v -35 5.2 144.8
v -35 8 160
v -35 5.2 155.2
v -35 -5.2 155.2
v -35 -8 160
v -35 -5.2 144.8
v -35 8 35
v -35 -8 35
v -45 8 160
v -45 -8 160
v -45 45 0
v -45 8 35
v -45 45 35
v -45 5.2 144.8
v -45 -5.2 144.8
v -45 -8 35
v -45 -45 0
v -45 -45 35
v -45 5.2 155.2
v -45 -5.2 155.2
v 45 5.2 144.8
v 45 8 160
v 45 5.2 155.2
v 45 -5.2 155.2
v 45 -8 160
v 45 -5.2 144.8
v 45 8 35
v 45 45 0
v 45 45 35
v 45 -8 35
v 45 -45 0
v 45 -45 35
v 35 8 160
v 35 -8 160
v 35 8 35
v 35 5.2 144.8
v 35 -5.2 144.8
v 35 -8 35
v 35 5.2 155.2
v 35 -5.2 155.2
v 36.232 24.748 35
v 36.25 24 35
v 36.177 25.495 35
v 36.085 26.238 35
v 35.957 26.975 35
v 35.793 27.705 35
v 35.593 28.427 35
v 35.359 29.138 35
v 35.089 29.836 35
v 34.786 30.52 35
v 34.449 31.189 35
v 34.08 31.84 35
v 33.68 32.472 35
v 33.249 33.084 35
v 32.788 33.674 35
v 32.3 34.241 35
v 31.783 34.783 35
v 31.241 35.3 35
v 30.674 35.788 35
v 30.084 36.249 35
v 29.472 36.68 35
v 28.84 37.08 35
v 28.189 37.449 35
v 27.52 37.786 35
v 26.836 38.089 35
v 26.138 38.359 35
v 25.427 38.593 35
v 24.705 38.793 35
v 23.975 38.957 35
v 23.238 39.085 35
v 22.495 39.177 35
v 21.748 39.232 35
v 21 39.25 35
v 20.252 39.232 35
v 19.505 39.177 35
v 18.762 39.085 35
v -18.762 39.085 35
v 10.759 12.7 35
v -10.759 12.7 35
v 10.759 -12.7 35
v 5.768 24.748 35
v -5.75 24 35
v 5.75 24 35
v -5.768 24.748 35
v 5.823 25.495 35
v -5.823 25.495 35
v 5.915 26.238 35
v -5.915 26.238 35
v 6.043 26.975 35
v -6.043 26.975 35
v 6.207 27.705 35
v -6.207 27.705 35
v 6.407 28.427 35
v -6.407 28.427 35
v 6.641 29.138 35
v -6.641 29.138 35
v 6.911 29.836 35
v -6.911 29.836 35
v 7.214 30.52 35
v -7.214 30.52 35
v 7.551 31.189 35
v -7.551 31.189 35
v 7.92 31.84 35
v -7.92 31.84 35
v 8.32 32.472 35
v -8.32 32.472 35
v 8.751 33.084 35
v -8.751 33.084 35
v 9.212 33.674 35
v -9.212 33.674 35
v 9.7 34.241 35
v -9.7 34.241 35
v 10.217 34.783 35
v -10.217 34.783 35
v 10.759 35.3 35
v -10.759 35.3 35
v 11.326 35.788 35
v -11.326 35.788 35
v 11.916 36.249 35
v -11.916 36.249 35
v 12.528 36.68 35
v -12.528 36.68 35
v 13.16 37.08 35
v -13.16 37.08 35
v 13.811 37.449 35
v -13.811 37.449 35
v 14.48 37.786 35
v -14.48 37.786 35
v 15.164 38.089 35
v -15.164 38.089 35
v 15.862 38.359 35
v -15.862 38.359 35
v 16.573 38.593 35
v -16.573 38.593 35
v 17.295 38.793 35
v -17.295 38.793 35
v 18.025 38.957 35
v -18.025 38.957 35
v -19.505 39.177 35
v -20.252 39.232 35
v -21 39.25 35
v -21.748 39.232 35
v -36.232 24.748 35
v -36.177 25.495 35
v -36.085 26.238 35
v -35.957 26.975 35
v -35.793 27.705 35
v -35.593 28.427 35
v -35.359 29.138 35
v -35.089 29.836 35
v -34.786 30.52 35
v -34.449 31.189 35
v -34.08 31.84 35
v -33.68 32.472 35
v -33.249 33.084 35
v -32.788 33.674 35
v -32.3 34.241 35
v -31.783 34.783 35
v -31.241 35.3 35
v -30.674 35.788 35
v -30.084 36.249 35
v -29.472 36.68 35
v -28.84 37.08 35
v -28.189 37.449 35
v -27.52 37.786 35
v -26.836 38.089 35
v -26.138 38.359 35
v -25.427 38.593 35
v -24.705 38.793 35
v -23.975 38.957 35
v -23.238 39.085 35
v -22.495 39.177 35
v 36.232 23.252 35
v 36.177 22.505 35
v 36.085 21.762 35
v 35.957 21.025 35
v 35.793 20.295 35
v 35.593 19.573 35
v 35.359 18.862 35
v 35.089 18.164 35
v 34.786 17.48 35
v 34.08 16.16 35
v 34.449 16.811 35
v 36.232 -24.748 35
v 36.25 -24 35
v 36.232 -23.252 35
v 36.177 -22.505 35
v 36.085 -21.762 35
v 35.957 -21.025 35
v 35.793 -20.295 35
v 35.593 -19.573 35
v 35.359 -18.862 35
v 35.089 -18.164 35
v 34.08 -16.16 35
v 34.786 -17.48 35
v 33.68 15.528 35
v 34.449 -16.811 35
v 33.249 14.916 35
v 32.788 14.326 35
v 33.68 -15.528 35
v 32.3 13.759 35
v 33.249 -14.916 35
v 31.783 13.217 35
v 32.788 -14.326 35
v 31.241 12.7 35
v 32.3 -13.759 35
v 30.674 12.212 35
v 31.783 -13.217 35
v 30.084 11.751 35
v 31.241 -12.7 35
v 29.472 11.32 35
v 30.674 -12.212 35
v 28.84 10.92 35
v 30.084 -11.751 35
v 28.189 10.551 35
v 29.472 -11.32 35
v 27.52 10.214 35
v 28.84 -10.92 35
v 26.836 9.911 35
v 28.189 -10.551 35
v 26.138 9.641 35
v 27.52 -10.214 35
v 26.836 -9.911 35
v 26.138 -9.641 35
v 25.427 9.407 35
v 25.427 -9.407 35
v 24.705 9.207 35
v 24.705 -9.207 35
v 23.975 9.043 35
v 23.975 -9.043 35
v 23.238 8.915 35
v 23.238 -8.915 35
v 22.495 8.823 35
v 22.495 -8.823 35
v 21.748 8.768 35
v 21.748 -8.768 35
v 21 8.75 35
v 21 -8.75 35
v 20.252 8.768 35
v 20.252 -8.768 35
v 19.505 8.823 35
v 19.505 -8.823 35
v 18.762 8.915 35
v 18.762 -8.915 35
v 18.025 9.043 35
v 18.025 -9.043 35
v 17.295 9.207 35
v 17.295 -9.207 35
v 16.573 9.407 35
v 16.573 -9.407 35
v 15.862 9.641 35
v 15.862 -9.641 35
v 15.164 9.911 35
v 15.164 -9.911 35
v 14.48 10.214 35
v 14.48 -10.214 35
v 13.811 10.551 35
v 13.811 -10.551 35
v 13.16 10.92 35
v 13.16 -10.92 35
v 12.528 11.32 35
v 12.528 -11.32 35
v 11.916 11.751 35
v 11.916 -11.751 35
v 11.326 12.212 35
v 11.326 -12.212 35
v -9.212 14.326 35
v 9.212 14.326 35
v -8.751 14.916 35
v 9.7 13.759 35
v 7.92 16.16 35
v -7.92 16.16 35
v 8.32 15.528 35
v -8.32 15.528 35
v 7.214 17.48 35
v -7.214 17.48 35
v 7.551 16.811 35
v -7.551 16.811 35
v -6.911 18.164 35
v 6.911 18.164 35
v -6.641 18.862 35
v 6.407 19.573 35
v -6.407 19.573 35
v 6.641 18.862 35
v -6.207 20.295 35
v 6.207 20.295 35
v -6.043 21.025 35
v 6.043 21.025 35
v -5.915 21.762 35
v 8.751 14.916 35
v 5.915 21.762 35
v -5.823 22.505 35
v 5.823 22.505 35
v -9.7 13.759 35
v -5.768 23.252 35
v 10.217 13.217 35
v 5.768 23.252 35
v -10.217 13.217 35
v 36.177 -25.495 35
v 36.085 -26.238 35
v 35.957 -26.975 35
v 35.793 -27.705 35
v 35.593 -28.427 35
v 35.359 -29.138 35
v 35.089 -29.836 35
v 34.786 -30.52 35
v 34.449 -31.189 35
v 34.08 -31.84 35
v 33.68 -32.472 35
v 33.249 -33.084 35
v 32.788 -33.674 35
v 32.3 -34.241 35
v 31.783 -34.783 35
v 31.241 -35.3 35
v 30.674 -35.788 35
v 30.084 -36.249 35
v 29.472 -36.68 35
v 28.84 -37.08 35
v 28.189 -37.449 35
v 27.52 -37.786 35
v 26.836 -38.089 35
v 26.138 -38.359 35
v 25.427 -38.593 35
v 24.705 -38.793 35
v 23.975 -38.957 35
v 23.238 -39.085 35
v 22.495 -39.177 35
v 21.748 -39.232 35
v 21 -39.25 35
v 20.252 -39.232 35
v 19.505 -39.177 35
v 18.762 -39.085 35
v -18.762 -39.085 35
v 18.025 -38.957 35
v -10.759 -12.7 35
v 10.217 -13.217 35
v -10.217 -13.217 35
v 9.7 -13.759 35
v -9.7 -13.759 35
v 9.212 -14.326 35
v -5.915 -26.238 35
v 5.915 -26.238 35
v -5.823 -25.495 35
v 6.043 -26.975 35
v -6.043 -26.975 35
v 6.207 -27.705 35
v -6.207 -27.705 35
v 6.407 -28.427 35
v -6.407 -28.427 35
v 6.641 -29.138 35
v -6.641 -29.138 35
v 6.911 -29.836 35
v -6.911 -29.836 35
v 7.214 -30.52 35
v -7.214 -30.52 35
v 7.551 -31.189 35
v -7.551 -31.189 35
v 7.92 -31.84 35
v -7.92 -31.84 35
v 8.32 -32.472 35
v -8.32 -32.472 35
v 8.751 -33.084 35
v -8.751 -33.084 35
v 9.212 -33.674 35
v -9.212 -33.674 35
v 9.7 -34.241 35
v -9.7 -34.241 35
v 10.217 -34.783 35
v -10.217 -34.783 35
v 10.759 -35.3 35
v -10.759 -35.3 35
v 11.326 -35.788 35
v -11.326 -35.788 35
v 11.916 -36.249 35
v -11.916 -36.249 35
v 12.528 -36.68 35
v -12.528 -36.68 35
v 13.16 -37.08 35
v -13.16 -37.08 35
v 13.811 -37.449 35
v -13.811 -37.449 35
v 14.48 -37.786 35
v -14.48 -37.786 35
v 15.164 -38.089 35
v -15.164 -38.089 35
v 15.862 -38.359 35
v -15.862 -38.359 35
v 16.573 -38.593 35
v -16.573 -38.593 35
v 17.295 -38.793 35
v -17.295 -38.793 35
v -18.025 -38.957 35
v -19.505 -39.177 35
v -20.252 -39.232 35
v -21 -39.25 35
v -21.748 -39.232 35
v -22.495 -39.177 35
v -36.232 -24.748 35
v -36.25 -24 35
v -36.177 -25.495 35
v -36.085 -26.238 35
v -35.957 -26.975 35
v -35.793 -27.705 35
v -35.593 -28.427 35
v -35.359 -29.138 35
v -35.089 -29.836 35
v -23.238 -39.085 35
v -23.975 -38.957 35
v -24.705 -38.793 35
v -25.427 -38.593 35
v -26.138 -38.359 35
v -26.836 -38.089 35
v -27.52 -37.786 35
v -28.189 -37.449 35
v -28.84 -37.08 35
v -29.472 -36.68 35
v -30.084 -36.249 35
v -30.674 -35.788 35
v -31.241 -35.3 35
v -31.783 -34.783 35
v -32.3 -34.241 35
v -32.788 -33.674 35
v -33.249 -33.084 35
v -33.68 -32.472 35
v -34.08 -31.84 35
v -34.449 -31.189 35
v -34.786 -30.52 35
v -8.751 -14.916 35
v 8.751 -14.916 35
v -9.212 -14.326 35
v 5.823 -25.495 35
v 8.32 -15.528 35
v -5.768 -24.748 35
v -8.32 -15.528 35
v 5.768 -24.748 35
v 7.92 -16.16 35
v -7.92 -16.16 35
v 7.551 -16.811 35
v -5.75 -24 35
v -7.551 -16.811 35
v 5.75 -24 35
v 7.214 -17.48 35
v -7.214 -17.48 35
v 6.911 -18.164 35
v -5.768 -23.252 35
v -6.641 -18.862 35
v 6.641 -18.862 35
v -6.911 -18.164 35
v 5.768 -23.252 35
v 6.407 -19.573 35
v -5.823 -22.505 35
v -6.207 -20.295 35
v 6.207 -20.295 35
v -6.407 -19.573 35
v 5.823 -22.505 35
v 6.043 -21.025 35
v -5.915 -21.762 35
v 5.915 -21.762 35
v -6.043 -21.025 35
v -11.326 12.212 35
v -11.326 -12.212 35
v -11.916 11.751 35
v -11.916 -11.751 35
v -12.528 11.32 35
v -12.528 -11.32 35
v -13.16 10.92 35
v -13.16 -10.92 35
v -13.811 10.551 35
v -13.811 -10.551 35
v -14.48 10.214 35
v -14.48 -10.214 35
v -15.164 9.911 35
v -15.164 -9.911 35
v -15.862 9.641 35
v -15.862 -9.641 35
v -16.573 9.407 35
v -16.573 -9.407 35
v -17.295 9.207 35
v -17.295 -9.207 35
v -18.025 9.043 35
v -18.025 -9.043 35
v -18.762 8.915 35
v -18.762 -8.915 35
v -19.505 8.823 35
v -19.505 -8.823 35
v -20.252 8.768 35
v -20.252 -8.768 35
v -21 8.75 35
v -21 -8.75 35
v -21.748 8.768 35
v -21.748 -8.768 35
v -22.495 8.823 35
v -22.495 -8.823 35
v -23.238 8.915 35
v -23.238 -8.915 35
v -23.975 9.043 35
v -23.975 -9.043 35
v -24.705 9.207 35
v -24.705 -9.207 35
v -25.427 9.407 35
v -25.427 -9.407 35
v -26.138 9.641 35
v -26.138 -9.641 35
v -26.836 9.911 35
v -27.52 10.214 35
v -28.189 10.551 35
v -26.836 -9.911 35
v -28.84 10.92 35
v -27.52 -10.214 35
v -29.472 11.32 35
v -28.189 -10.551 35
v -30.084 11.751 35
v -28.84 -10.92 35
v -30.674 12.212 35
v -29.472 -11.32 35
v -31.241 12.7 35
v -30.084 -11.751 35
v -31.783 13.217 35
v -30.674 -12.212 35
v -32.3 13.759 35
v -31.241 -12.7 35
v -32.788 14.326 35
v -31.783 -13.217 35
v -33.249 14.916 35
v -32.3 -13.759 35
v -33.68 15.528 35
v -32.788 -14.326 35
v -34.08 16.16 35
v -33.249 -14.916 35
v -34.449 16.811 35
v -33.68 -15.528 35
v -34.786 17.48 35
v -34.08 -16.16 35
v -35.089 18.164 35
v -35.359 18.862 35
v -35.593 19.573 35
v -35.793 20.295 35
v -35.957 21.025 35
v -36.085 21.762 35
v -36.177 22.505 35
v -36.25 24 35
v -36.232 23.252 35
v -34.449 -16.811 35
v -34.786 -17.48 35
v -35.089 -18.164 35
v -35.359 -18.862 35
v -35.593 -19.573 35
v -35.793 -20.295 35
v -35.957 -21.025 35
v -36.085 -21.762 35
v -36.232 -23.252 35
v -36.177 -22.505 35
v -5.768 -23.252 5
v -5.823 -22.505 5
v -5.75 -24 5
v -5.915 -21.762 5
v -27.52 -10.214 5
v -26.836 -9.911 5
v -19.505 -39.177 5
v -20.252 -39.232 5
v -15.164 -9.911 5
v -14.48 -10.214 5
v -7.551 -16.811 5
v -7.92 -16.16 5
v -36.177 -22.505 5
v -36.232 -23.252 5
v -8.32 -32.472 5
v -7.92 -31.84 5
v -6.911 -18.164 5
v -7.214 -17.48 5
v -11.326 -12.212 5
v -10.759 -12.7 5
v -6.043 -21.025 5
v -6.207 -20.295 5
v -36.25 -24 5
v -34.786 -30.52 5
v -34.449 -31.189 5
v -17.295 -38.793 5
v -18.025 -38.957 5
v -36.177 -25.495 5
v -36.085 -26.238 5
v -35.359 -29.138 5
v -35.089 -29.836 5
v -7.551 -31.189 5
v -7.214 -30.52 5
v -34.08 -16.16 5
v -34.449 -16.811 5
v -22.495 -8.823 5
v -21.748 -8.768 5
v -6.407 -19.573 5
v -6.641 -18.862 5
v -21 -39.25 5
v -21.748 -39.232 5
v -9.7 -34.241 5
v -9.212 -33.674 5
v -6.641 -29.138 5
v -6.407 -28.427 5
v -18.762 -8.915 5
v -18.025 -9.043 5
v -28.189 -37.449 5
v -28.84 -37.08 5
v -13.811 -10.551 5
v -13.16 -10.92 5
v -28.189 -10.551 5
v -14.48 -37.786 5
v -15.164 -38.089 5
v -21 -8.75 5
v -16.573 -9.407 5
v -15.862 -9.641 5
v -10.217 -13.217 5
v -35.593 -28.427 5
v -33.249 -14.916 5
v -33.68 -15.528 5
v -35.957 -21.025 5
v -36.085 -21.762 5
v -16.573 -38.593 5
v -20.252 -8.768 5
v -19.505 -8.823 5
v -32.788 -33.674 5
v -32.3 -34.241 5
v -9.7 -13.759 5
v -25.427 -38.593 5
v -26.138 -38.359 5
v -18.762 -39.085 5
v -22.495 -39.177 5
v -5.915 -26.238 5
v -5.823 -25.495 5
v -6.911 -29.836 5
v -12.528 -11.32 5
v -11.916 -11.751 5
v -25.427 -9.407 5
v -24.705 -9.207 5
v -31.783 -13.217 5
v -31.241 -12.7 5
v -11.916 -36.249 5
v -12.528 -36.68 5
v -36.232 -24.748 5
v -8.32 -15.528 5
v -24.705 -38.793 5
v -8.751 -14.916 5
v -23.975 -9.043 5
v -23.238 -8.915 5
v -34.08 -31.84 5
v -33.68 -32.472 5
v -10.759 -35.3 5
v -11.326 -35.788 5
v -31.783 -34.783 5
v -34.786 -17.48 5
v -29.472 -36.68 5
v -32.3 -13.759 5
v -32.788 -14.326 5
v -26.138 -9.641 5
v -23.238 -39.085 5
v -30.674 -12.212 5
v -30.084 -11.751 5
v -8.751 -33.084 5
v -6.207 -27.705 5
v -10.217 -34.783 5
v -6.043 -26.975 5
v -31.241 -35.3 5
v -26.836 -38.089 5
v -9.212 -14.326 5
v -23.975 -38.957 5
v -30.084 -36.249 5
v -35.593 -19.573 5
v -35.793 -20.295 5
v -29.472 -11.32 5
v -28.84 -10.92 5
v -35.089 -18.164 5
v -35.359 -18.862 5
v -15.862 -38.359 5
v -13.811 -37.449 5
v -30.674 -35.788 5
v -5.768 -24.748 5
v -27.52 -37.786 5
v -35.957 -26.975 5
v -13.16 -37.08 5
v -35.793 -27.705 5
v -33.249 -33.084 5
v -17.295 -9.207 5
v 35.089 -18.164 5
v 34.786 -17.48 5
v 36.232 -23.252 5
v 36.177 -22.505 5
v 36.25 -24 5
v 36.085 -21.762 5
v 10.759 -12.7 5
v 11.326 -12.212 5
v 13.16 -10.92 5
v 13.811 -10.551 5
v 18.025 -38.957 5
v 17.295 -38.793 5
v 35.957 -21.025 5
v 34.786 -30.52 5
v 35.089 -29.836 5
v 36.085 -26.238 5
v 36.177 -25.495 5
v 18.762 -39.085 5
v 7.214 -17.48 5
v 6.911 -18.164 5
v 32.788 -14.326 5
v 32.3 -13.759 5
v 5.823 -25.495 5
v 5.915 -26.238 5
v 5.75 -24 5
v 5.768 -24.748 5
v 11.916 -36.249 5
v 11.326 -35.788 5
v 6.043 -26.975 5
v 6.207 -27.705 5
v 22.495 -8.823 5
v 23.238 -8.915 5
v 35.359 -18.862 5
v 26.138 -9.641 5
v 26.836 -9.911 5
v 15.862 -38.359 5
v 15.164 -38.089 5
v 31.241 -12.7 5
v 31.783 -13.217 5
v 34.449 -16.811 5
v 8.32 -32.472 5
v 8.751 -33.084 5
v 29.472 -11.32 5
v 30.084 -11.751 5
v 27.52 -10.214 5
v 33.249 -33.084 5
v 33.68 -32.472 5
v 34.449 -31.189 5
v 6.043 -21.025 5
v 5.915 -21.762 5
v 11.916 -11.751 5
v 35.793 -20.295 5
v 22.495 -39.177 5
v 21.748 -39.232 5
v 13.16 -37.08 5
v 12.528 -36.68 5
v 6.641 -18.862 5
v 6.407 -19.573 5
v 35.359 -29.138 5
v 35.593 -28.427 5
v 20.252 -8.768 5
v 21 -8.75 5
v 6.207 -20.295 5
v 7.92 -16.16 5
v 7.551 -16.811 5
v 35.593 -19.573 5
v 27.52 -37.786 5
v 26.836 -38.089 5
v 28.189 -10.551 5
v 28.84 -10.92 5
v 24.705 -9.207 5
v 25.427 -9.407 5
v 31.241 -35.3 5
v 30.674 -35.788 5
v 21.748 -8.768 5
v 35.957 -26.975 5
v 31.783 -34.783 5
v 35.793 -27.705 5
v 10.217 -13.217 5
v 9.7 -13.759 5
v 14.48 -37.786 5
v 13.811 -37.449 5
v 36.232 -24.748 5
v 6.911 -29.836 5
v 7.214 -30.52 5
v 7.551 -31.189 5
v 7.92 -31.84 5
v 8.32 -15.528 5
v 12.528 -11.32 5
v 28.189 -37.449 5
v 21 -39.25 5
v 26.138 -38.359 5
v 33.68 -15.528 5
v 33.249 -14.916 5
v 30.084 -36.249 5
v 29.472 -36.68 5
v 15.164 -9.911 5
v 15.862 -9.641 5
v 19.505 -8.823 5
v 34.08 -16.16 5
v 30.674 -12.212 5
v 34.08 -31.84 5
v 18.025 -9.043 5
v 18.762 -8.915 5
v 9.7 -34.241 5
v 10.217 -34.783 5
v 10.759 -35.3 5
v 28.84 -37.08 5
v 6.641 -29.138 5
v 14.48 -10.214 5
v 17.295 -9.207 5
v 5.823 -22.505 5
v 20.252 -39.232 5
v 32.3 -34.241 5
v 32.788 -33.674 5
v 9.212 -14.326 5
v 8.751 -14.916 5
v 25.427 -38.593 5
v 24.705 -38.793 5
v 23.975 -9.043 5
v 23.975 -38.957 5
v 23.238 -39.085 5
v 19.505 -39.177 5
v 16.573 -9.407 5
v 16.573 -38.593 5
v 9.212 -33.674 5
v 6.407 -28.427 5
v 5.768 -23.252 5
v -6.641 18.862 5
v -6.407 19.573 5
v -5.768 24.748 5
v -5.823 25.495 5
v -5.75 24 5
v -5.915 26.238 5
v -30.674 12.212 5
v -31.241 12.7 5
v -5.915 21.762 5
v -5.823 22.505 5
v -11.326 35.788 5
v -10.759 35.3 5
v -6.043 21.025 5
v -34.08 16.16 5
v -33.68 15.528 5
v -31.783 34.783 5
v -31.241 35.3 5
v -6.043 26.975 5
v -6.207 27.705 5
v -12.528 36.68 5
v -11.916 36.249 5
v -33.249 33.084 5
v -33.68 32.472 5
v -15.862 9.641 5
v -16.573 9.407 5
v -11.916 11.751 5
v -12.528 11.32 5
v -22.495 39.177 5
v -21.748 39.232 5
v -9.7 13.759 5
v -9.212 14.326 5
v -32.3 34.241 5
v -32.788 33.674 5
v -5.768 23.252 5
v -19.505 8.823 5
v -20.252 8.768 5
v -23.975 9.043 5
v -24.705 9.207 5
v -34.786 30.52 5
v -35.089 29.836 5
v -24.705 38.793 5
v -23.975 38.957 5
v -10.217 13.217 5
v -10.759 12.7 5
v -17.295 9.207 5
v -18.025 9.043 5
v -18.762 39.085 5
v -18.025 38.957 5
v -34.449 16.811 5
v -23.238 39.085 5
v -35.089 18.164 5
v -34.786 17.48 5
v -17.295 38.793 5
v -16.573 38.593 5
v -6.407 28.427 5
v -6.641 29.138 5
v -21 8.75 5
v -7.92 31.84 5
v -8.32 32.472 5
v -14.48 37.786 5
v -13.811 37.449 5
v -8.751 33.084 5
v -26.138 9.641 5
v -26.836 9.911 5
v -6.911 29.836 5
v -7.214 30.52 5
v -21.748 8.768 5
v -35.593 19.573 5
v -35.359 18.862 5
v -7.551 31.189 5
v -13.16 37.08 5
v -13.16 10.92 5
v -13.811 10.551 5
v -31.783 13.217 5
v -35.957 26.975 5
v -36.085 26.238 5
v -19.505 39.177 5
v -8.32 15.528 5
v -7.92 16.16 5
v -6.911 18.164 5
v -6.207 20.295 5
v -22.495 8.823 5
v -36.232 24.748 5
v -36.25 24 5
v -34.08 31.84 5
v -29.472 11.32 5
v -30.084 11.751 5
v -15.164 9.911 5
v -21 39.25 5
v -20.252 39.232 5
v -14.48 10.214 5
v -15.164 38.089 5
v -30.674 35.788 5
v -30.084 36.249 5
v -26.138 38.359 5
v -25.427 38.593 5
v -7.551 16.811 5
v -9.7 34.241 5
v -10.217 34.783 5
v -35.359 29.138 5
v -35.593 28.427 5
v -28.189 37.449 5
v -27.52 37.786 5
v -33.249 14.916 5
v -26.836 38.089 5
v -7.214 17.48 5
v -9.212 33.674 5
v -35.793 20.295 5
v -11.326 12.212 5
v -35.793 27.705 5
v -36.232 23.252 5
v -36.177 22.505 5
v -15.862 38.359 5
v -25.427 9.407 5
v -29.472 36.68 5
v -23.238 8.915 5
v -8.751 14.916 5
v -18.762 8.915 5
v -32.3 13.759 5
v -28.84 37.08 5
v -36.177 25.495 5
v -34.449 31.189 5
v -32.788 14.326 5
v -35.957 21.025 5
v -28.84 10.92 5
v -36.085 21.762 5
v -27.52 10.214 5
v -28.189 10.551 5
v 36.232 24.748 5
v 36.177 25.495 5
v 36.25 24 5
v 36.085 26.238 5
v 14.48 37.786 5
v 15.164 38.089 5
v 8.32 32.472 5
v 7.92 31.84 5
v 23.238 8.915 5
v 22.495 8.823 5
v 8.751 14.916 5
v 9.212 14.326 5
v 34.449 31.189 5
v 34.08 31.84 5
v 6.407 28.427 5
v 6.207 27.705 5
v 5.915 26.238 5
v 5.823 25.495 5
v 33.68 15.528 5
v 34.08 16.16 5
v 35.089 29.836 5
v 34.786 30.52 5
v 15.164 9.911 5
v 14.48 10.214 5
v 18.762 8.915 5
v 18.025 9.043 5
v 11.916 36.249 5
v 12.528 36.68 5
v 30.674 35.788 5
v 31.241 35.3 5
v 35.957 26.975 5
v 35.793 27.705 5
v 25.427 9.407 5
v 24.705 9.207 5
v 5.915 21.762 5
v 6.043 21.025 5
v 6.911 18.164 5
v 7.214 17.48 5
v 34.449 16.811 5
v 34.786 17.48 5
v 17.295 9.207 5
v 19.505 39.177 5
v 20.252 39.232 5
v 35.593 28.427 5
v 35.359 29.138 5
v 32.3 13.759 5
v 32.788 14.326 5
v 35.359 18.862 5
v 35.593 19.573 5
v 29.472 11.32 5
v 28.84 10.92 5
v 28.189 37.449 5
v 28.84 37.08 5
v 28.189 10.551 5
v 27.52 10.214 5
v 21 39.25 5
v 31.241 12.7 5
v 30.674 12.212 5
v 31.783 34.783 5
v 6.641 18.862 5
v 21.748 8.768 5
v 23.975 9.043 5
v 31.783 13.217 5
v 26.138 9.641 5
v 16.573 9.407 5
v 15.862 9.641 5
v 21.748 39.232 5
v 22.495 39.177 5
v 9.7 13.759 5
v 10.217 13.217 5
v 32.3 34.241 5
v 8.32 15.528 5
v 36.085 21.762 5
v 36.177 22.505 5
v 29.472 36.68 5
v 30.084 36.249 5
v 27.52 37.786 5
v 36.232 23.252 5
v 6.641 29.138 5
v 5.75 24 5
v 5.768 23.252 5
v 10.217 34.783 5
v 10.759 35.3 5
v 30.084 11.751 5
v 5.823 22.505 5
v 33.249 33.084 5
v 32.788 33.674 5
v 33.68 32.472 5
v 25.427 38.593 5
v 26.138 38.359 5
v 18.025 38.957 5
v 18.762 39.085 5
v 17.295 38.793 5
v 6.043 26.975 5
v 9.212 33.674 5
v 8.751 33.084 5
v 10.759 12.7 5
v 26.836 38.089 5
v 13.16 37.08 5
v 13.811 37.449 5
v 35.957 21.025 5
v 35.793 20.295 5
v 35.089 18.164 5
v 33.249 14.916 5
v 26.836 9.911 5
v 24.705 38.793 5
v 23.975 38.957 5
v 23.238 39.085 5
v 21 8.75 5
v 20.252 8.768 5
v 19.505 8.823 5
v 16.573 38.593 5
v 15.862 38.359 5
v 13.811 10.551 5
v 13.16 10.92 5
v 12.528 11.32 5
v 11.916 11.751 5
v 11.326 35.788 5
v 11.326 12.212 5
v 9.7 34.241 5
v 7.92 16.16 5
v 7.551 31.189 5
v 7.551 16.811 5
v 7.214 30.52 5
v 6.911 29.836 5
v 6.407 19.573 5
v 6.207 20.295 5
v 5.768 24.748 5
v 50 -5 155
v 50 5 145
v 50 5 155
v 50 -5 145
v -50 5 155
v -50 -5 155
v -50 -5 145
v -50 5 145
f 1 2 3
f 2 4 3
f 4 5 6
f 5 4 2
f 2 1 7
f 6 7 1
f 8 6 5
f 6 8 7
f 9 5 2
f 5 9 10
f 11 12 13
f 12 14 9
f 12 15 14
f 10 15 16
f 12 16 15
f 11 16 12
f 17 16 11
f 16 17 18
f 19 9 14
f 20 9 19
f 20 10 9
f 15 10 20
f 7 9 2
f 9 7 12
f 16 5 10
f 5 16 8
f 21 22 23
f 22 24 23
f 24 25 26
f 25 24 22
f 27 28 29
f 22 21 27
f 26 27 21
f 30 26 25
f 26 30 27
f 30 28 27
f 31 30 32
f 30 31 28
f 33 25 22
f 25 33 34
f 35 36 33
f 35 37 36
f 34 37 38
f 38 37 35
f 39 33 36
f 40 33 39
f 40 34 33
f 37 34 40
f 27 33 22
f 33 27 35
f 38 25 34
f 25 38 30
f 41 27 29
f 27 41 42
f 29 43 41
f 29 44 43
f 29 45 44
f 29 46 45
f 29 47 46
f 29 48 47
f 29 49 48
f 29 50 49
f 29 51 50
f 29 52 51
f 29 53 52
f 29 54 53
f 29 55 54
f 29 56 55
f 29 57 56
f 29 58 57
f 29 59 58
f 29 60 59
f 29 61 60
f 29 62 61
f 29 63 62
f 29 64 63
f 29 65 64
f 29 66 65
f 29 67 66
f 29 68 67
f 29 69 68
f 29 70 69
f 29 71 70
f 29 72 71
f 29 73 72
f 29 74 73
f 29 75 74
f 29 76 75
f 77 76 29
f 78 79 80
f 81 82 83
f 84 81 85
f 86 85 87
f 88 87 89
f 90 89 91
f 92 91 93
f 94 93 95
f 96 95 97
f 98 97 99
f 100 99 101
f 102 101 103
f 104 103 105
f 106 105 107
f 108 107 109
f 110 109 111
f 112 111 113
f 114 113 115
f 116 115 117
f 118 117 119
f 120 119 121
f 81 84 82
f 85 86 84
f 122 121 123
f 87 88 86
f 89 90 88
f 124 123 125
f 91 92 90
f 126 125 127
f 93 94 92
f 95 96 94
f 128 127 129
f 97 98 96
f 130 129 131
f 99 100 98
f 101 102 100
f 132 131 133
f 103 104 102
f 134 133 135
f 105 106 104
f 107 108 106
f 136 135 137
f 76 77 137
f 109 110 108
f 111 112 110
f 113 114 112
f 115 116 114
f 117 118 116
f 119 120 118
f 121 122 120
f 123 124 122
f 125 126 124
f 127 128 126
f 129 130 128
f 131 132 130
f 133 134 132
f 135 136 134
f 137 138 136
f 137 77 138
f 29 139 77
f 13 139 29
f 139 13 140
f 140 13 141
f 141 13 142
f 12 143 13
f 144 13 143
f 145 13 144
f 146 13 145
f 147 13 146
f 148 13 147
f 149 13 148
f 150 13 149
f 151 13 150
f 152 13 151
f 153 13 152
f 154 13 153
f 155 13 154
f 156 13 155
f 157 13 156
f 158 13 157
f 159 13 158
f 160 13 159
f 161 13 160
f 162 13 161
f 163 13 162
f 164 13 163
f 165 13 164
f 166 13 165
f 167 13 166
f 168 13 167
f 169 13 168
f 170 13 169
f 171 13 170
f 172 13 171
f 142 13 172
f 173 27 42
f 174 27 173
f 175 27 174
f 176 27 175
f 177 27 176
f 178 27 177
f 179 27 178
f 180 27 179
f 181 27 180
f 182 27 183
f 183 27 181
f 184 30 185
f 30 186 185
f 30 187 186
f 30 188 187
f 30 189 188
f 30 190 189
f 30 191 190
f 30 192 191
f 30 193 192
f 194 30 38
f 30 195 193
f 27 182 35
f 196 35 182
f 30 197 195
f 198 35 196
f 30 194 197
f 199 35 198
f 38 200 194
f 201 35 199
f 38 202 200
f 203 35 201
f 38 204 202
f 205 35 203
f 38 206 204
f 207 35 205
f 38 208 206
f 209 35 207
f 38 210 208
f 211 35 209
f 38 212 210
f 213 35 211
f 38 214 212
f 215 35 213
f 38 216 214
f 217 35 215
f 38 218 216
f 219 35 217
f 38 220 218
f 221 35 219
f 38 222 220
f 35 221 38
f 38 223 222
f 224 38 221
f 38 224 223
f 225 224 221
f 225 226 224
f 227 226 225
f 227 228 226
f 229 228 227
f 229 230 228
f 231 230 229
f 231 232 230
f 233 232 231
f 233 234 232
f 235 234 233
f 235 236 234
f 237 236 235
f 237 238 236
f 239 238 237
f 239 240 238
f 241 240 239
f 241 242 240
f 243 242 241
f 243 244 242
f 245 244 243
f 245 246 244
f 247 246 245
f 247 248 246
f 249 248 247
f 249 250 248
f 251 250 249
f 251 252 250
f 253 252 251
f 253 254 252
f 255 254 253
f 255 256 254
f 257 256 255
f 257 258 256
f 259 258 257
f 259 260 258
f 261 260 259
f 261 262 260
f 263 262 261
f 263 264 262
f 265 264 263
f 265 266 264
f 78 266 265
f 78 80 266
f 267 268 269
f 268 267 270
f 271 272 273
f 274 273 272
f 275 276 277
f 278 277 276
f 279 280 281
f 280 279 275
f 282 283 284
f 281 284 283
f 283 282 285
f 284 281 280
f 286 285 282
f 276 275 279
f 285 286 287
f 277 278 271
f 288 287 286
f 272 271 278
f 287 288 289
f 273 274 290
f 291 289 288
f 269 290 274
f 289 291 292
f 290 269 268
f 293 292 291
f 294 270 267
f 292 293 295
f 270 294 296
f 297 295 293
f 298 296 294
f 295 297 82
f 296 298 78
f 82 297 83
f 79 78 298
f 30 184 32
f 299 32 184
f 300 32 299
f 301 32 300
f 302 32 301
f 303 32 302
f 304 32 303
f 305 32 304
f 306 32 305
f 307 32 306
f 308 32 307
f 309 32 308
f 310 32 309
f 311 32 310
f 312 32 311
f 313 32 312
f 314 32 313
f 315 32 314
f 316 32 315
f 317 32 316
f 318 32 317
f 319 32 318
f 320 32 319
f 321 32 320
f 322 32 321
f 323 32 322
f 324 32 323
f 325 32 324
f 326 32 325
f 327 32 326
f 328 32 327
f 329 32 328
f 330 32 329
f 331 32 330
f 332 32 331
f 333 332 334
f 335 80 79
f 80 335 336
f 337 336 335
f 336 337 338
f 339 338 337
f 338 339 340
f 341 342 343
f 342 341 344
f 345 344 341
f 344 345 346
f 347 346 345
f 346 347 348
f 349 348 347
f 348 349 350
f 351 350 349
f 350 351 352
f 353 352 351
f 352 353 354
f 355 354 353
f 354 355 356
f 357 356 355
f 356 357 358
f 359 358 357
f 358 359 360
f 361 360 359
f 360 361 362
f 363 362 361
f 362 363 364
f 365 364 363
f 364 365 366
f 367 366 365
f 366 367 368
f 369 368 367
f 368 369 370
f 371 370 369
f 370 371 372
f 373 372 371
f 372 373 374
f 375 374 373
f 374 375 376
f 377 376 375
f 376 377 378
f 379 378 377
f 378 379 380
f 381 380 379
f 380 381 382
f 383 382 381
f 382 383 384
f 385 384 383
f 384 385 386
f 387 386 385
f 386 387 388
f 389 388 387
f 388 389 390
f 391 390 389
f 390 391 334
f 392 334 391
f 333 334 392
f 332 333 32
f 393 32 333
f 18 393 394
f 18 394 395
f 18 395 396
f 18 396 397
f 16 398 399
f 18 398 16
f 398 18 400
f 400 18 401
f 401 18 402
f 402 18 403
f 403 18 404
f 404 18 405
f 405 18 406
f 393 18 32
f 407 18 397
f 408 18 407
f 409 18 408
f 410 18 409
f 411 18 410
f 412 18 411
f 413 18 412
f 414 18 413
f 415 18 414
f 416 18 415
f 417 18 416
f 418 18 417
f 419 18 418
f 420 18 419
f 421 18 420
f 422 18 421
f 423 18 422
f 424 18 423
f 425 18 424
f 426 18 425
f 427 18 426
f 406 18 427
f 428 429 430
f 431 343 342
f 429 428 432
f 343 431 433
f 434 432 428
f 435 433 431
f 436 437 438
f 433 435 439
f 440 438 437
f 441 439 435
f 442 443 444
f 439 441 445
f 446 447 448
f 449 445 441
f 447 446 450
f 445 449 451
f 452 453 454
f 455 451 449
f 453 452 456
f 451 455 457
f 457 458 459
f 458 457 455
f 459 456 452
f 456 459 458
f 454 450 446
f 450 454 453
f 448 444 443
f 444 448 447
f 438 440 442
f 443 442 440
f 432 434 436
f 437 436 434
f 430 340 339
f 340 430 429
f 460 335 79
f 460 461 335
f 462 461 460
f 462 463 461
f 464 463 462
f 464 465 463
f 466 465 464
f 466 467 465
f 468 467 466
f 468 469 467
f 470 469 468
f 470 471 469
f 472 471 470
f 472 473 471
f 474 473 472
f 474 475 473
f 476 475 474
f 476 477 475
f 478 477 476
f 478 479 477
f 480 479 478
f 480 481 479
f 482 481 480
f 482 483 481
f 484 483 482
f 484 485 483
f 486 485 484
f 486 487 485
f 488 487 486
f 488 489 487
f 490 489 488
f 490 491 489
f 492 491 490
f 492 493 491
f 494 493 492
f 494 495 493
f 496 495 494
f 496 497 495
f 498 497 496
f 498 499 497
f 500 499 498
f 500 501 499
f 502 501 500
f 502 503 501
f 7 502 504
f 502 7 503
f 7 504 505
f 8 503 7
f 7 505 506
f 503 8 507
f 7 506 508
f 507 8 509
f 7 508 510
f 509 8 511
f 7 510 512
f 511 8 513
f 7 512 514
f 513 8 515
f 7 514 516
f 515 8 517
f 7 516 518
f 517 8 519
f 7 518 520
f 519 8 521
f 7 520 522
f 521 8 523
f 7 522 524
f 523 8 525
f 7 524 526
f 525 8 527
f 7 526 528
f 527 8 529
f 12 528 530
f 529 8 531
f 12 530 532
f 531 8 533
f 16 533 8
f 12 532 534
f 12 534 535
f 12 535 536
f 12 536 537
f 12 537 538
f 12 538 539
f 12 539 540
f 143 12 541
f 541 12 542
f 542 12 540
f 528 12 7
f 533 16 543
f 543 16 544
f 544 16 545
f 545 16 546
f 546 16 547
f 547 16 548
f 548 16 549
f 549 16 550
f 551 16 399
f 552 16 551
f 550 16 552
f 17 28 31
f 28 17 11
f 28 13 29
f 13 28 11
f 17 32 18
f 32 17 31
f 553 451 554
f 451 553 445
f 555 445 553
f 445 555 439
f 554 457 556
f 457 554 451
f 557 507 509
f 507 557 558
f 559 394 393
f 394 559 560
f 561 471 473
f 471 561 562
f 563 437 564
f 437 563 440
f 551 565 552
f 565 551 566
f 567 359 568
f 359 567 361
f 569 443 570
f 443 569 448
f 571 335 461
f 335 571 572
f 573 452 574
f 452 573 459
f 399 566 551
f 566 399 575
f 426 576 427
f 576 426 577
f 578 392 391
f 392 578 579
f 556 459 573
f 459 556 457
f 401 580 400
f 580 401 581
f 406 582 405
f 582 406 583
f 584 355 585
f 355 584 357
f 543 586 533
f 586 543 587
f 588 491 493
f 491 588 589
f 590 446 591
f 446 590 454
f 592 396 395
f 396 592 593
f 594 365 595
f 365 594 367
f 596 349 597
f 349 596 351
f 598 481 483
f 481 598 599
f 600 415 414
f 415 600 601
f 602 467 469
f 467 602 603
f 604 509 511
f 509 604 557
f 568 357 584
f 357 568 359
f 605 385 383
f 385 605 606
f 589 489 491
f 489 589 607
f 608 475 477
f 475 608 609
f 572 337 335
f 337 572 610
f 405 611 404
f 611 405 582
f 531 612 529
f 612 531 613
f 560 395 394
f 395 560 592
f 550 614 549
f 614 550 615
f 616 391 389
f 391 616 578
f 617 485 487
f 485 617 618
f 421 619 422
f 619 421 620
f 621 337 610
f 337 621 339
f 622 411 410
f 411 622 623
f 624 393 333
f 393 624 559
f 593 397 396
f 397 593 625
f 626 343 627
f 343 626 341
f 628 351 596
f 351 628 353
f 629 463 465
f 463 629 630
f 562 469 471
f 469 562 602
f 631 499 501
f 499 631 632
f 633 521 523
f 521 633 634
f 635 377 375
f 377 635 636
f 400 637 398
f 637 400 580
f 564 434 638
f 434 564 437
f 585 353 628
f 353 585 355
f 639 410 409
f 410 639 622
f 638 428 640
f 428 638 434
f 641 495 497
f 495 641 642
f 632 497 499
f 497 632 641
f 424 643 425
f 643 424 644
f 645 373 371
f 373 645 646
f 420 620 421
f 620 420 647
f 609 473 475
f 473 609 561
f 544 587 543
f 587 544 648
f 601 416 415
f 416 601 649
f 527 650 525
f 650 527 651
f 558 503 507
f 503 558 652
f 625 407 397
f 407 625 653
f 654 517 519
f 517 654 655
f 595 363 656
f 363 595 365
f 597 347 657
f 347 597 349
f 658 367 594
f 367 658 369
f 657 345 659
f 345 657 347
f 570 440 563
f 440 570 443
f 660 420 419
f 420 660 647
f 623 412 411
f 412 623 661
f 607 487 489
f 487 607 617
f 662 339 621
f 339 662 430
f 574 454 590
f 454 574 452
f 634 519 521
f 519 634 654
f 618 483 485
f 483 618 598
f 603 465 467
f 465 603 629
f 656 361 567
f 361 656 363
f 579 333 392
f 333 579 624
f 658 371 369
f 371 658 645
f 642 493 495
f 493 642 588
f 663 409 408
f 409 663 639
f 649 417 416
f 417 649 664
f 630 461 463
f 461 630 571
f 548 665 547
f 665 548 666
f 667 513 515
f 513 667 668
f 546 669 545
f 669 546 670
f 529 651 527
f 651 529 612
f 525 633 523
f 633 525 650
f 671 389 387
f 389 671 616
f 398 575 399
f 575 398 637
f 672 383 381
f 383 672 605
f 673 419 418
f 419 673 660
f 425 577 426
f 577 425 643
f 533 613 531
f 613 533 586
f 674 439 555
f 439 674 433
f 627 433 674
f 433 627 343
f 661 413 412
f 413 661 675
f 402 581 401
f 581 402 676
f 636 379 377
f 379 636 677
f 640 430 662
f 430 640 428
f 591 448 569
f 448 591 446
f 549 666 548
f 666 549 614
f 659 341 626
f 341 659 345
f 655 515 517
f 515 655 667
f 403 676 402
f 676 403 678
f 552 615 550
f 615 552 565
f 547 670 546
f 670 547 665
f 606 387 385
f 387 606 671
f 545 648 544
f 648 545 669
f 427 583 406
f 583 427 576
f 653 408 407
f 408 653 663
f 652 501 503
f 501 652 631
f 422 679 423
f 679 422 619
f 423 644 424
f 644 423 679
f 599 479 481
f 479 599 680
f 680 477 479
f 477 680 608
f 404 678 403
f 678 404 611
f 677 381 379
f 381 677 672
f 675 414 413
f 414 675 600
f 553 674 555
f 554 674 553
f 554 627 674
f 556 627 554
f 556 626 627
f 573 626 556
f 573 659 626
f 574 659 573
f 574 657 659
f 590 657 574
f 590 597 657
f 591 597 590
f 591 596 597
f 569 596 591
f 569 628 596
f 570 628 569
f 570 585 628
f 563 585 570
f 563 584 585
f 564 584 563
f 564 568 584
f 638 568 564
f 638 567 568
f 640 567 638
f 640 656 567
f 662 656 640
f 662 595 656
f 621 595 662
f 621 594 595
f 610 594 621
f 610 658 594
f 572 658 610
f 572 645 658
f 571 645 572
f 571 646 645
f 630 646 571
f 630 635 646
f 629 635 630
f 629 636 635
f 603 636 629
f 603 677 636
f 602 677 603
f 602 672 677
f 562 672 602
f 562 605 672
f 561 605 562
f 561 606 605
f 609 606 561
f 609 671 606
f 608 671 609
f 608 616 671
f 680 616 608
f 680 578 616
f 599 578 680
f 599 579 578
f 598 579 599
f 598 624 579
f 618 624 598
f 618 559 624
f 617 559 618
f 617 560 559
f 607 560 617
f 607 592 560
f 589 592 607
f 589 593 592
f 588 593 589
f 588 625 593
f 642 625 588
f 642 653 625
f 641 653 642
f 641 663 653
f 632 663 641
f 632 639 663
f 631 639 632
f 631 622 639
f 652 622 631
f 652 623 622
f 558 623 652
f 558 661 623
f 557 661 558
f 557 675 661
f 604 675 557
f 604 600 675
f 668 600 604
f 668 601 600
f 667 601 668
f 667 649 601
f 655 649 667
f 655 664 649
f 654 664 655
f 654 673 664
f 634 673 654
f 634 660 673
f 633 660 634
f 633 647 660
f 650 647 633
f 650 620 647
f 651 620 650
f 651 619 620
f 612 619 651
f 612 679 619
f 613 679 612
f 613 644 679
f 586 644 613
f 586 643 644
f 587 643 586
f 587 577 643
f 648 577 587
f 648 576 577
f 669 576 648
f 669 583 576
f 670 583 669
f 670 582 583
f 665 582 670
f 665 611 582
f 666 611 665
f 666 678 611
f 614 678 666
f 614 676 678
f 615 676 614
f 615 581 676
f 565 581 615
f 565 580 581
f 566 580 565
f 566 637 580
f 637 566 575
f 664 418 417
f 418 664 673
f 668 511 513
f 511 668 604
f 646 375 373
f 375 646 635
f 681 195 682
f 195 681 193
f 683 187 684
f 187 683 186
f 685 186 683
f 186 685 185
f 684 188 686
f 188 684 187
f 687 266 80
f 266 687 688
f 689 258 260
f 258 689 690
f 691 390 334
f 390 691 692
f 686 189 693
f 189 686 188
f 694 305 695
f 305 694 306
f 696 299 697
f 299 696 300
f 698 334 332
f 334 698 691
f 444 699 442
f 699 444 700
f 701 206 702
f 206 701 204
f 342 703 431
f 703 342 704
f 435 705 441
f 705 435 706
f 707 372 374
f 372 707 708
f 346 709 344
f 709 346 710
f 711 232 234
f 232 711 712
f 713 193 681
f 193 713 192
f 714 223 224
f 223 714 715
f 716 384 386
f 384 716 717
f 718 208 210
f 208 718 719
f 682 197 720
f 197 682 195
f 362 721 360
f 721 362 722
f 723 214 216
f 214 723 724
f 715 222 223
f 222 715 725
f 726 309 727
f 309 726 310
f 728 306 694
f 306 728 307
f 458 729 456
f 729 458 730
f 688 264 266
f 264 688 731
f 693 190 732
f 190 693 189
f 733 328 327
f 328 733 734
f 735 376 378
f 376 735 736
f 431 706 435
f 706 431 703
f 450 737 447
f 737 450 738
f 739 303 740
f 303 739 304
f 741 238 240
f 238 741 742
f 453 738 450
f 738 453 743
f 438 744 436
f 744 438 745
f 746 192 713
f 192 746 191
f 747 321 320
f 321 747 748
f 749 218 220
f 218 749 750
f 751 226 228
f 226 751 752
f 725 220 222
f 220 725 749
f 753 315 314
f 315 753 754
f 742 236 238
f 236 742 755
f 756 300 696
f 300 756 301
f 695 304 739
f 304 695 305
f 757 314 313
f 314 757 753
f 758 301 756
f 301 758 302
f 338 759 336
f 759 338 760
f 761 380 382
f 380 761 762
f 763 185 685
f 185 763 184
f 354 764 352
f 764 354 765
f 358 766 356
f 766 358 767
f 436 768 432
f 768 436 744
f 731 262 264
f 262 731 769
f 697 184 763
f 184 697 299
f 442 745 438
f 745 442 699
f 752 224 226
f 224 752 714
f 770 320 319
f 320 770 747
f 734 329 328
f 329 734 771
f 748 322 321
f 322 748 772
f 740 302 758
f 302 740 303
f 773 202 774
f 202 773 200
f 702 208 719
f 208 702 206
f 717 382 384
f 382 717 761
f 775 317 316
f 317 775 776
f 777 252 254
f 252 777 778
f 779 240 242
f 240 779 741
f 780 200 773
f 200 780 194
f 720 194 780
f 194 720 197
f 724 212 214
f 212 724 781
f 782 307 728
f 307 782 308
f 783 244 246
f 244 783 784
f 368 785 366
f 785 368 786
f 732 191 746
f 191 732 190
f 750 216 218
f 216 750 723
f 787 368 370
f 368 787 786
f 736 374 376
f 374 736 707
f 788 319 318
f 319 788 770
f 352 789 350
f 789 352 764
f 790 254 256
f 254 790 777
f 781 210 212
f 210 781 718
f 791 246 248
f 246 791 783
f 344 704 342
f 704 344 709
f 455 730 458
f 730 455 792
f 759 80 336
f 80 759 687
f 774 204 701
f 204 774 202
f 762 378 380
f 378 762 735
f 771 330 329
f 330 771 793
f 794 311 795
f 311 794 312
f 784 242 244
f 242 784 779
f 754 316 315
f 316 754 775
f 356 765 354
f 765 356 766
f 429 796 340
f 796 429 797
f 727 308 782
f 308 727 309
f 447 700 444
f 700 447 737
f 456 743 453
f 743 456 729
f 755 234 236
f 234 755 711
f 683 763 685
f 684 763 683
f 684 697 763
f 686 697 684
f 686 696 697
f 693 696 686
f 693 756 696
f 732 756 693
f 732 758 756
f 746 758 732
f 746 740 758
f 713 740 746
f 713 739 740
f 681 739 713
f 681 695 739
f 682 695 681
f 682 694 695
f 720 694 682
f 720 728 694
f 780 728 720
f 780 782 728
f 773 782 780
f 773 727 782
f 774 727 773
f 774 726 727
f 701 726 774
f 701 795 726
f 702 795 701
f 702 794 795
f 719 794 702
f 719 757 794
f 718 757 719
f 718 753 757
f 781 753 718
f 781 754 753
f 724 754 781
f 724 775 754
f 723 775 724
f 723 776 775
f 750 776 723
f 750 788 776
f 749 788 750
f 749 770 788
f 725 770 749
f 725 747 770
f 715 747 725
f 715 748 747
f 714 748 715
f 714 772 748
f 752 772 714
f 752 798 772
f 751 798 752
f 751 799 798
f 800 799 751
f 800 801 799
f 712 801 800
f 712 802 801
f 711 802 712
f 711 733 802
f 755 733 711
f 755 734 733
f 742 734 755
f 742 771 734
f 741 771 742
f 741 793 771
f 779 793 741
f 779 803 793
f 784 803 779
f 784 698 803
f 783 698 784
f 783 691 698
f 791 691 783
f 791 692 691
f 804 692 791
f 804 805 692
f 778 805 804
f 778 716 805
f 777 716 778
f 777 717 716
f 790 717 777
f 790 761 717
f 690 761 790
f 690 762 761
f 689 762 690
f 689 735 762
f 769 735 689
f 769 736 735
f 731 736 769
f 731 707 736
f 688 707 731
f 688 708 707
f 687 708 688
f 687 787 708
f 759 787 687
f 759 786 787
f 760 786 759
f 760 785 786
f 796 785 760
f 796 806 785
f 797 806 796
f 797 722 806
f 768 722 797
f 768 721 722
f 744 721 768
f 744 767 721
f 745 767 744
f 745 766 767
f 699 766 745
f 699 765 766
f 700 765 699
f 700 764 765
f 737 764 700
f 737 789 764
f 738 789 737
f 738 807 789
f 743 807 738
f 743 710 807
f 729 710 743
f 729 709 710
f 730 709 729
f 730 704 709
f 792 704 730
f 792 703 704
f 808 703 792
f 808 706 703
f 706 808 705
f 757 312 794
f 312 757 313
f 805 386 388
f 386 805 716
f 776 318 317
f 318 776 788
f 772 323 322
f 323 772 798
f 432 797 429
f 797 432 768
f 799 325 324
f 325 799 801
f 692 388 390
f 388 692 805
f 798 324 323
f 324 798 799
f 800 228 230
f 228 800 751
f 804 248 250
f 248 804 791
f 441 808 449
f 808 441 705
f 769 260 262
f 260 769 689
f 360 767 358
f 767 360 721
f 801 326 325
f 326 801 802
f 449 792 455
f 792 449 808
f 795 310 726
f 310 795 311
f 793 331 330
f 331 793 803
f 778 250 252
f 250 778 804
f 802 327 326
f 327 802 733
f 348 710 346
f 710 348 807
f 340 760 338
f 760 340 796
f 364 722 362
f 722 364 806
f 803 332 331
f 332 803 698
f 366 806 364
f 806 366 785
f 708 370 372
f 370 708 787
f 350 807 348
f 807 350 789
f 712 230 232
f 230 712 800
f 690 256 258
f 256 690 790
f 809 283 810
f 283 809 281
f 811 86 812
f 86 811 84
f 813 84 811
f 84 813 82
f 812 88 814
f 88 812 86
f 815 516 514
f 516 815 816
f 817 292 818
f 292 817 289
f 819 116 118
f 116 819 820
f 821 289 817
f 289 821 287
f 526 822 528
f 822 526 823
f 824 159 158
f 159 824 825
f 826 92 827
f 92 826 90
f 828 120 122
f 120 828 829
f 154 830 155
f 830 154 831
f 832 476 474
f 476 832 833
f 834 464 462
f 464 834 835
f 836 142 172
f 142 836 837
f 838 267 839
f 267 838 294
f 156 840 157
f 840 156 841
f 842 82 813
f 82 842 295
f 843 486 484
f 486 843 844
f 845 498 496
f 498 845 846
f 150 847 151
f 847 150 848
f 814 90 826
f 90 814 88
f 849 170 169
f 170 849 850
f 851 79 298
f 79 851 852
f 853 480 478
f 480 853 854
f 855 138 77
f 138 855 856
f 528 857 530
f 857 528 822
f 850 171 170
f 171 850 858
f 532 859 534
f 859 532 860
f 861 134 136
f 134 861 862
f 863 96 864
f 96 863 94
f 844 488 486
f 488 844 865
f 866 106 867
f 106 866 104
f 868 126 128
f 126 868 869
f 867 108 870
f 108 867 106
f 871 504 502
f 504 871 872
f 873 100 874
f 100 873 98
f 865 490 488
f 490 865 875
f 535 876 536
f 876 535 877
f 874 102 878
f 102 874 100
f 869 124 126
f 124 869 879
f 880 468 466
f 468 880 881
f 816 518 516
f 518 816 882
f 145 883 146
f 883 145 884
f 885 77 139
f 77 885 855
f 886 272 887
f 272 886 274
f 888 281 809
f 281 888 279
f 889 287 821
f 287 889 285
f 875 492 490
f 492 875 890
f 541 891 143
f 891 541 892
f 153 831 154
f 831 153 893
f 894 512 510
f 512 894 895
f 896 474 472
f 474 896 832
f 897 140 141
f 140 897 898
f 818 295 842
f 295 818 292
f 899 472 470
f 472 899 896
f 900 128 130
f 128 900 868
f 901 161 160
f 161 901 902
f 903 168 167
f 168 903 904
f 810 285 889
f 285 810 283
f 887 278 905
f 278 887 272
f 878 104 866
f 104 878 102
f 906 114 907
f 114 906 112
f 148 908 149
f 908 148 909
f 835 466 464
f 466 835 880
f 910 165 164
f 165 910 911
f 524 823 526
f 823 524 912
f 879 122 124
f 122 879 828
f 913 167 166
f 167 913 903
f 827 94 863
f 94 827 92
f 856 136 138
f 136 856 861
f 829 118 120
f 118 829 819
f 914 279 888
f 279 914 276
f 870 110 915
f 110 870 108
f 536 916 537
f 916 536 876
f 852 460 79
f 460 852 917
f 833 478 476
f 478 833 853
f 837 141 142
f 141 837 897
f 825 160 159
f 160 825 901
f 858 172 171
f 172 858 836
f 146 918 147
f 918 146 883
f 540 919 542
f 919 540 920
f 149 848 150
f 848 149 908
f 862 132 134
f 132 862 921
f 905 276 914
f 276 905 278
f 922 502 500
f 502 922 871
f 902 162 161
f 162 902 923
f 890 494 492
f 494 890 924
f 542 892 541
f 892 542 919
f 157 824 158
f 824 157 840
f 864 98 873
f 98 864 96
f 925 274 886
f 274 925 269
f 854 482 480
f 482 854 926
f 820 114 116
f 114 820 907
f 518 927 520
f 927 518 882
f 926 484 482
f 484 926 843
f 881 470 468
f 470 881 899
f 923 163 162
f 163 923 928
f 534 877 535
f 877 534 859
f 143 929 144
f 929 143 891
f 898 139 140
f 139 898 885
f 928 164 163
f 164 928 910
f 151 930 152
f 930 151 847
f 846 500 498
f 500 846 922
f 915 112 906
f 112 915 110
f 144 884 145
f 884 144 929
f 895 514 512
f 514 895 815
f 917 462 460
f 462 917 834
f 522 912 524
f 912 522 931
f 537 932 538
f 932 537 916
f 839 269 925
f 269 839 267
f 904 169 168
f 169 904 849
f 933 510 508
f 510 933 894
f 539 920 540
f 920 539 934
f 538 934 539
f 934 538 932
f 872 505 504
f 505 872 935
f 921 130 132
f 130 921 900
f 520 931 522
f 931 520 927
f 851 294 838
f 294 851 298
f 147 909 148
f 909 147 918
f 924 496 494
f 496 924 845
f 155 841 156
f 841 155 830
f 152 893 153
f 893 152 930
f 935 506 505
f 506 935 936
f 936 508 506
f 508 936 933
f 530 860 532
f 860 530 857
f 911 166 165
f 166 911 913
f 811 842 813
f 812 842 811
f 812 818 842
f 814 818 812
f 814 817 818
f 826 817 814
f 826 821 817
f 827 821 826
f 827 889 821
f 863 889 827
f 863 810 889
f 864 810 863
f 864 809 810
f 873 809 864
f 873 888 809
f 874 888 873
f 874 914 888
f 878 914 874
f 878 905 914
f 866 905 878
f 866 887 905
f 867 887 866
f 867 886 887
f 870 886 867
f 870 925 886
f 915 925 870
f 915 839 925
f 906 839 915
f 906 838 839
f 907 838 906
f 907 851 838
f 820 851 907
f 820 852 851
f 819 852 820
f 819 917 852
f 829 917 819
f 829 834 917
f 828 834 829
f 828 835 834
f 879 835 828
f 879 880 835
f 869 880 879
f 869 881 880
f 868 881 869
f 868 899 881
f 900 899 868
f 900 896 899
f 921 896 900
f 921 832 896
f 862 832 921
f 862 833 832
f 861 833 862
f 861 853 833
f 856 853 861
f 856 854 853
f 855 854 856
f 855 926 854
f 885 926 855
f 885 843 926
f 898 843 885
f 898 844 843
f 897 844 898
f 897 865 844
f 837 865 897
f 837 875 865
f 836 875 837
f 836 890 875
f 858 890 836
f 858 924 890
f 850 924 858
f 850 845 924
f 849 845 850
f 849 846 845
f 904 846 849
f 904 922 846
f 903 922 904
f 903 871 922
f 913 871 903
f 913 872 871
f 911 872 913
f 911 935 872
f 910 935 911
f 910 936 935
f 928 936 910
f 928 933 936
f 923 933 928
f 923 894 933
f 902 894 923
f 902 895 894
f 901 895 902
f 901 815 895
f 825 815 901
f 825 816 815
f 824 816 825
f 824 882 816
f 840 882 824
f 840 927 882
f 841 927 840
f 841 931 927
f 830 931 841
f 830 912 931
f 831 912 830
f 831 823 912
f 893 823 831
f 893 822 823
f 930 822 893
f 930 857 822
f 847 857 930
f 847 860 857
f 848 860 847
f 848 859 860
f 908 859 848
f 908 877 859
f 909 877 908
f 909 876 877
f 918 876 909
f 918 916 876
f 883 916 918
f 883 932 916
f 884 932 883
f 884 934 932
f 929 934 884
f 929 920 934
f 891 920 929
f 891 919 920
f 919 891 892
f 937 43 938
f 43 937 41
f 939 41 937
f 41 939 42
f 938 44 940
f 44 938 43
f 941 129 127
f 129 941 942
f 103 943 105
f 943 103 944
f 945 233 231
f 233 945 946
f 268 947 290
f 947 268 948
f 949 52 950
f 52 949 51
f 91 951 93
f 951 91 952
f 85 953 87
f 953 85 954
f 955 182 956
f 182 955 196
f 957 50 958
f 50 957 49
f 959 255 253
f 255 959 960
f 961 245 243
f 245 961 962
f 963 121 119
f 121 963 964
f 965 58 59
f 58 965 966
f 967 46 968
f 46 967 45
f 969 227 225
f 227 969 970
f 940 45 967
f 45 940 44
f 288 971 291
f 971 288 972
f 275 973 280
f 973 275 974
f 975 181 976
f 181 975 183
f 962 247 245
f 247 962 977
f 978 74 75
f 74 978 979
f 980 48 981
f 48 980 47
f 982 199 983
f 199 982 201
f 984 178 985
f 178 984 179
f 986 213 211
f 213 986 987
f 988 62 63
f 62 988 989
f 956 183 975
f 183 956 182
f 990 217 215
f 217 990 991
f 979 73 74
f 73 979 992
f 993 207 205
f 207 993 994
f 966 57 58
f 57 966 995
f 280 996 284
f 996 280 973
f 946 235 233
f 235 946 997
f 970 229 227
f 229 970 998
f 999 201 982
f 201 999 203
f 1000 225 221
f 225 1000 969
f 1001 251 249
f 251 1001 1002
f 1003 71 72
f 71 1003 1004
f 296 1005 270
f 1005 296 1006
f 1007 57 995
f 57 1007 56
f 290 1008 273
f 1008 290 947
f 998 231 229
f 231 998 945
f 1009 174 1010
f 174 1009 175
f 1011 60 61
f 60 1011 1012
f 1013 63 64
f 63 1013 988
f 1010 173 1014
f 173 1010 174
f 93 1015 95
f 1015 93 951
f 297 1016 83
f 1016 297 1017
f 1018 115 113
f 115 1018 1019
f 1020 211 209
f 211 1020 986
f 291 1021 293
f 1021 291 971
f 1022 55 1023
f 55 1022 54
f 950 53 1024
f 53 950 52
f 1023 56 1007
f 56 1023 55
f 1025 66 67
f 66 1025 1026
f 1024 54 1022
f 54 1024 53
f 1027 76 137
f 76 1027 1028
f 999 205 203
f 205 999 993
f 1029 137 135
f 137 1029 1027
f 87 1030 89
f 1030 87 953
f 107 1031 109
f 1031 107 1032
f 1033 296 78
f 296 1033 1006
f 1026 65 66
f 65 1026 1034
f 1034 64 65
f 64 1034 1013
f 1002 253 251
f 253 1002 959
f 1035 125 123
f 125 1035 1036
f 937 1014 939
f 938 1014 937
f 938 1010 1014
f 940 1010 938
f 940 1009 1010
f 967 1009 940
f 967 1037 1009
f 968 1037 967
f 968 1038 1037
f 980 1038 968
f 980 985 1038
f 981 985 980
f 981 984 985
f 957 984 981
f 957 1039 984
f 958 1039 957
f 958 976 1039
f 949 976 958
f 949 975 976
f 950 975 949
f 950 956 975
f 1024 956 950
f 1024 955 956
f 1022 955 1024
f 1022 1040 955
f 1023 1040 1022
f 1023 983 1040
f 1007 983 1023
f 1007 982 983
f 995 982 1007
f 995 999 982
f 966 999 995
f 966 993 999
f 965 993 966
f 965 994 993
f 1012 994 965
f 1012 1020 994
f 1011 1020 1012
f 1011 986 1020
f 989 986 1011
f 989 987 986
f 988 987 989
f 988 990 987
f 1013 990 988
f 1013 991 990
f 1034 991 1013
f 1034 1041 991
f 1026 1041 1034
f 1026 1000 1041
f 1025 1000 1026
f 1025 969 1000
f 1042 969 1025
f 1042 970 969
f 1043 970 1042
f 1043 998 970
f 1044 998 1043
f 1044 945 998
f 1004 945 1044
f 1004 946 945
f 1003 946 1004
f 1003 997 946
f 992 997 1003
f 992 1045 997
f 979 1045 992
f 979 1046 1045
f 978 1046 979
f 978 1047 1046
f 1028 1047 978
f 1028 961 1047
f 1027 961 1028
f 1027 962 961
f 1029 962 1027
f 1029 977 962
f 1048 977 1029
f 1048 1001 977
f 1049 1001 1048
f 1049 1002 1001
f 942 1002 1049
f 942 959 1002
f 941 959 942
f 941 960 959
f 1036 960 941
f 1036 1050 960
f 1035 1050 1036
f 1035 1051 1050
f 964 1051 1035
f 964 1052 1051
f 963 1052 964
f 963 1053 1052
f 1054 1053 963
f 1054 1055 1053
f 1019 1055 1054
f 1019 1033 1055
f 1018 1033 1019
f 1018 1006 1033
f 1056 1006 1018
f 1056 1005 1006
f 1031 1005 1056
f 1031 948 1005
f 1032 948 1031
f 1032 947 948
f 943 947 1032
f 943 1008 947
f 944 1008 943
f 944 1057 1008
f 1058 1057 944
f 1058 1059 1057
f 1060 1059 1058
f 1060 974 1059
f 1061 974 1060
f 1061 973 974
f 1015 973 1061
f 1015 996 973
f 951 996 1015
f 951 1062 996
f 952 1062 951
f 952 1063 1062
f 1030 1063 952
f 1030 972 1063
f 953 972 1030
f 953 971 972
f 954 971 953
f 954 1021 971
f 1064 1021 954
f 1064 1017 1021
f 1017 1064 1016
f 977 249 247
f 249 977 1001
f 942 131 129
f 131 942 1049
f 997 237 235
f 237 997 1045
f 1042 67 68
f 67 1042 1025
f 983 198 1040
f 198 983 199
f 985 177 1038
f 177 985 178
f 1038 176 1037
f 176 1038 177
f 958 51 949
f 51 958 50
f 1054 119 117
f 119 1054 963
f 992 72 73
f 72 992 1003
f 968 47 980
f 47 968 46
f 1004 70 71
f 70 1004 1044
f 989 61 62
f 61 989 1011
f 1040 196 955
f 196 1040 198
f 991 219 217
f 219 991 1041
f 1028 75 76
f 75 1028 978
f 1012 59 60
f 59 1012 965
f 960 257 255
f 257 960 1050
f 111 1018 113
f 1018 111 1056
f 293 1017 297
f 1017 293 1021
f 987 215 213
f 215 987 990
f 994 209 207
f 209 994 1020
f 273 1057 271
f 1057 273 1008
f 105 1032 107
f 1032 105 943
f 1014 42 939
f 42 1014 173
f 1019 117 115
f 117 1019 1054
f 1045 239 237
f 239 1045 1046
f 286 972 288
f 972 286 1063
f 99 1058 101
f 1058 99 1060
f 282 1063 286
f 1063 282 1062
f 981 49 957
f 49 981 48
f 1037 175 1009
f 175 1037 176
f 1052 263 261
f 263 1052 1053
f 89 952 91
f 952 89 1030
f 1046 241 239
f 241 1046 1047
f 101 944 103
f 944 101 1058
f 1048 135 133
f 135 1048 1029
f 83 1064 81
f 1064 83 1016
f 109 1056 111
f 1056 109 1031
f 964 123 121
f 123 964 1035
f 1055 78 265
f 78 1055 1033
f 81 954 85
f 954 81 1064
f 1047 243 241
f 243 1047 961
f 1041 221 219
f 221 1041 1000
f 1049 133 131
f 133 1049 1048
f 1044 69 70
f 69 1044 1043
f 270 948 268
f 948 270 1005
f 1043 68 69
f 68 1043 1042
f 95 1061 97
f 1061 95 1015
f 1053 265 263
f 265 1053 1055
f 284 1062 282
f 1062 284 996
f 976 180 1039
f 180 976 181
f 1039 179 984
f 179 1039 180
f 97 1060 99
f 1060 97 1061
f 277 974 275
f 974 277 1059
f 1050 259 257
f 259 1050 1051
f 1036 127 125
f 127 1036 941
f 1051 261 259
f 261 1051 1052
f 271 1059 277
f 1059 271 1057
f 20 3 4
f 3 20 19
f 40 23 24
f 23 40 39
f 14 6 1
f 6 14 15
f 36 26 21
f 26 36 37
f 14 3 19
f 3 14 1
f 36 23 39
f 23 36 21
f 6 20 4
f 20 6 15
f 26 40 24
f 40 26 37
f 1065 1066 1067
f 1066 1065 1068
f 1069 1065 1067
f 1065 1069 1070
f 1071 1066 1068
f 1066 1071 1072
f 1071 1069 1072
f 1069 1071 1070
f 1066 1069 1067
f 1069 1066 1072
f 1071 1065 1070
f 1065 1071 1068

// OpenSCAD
// KNOWN-WRONG PART (must fail): the handle bar is printed in place through the posts (one body)
// Carrier for four 50 mL conical tubes with a carrying handle; two parts printed side by side
// Category: hardware. Part 1: a base block with four blind seats and two posts with square holes
// near the top. Part 2: a square handle bar, printed lying flat, pushed through both posts.
// Print: PETG, 0.2 mm layers, 4 perimeters; the posts are tall, so print slowly near the top.
// A drop of glue (or a tight fit) keeps the bar in place.
// SPDX-License-Identifier: CERN-OHL-P-2.0

/* [Carrier] */
base = [90, 90, 35];      // X, Y, Z [mm], centred on the origin
seat_d = 30.5;            // 50 mL conical tube is ~29-30 mm across
seat_depth = 30;          // 5 mm floor
seat_pos = [[-21, -24], [21, -24], [-21, 24], [21, 24]];
post = [10, 16];          // post X, Y; flush with the X end faces, centred on y = 0
post_top = 160;
hole = 10.4;              // square hole along X for the handle bar
hole_z = 150;
bar = [100, 10, 10];      // handle bar X, Y, Z
bar_gap = 10;             // gap between the bar and the base's +Y face

/* [Hidden] */
eps = 0.01;

// part 1: carrier
difference() {
    union() {
        translate([-base.x / 2, -base.y / 2, 0]) cube(base);
        for (s = [-1, 1])
            translate([s > 0 ? base.x / 2 - post.x : -base.x / 2, -post.y / 2, base.z - eps])
                cube([post.x, post.y, post_top - base.z + eps]);
    }
    for (p = seat_pos)
        translate([p.x, p.y, base.z - seat_depth]) cylinder(d = seat_d, h = seat_depth + 1, $fn = 128);
    translate([-base.x / 2 - 1, -hole / 2, hole_z - hole / 2]) cube([base.x + 2, hole, hole]);
}
// part 2: handle bar, beside the base on the +Y side
translate([-bar.x / 2, -bar.y / 2, hole_z - bar.z / 2]) cube(bar);
